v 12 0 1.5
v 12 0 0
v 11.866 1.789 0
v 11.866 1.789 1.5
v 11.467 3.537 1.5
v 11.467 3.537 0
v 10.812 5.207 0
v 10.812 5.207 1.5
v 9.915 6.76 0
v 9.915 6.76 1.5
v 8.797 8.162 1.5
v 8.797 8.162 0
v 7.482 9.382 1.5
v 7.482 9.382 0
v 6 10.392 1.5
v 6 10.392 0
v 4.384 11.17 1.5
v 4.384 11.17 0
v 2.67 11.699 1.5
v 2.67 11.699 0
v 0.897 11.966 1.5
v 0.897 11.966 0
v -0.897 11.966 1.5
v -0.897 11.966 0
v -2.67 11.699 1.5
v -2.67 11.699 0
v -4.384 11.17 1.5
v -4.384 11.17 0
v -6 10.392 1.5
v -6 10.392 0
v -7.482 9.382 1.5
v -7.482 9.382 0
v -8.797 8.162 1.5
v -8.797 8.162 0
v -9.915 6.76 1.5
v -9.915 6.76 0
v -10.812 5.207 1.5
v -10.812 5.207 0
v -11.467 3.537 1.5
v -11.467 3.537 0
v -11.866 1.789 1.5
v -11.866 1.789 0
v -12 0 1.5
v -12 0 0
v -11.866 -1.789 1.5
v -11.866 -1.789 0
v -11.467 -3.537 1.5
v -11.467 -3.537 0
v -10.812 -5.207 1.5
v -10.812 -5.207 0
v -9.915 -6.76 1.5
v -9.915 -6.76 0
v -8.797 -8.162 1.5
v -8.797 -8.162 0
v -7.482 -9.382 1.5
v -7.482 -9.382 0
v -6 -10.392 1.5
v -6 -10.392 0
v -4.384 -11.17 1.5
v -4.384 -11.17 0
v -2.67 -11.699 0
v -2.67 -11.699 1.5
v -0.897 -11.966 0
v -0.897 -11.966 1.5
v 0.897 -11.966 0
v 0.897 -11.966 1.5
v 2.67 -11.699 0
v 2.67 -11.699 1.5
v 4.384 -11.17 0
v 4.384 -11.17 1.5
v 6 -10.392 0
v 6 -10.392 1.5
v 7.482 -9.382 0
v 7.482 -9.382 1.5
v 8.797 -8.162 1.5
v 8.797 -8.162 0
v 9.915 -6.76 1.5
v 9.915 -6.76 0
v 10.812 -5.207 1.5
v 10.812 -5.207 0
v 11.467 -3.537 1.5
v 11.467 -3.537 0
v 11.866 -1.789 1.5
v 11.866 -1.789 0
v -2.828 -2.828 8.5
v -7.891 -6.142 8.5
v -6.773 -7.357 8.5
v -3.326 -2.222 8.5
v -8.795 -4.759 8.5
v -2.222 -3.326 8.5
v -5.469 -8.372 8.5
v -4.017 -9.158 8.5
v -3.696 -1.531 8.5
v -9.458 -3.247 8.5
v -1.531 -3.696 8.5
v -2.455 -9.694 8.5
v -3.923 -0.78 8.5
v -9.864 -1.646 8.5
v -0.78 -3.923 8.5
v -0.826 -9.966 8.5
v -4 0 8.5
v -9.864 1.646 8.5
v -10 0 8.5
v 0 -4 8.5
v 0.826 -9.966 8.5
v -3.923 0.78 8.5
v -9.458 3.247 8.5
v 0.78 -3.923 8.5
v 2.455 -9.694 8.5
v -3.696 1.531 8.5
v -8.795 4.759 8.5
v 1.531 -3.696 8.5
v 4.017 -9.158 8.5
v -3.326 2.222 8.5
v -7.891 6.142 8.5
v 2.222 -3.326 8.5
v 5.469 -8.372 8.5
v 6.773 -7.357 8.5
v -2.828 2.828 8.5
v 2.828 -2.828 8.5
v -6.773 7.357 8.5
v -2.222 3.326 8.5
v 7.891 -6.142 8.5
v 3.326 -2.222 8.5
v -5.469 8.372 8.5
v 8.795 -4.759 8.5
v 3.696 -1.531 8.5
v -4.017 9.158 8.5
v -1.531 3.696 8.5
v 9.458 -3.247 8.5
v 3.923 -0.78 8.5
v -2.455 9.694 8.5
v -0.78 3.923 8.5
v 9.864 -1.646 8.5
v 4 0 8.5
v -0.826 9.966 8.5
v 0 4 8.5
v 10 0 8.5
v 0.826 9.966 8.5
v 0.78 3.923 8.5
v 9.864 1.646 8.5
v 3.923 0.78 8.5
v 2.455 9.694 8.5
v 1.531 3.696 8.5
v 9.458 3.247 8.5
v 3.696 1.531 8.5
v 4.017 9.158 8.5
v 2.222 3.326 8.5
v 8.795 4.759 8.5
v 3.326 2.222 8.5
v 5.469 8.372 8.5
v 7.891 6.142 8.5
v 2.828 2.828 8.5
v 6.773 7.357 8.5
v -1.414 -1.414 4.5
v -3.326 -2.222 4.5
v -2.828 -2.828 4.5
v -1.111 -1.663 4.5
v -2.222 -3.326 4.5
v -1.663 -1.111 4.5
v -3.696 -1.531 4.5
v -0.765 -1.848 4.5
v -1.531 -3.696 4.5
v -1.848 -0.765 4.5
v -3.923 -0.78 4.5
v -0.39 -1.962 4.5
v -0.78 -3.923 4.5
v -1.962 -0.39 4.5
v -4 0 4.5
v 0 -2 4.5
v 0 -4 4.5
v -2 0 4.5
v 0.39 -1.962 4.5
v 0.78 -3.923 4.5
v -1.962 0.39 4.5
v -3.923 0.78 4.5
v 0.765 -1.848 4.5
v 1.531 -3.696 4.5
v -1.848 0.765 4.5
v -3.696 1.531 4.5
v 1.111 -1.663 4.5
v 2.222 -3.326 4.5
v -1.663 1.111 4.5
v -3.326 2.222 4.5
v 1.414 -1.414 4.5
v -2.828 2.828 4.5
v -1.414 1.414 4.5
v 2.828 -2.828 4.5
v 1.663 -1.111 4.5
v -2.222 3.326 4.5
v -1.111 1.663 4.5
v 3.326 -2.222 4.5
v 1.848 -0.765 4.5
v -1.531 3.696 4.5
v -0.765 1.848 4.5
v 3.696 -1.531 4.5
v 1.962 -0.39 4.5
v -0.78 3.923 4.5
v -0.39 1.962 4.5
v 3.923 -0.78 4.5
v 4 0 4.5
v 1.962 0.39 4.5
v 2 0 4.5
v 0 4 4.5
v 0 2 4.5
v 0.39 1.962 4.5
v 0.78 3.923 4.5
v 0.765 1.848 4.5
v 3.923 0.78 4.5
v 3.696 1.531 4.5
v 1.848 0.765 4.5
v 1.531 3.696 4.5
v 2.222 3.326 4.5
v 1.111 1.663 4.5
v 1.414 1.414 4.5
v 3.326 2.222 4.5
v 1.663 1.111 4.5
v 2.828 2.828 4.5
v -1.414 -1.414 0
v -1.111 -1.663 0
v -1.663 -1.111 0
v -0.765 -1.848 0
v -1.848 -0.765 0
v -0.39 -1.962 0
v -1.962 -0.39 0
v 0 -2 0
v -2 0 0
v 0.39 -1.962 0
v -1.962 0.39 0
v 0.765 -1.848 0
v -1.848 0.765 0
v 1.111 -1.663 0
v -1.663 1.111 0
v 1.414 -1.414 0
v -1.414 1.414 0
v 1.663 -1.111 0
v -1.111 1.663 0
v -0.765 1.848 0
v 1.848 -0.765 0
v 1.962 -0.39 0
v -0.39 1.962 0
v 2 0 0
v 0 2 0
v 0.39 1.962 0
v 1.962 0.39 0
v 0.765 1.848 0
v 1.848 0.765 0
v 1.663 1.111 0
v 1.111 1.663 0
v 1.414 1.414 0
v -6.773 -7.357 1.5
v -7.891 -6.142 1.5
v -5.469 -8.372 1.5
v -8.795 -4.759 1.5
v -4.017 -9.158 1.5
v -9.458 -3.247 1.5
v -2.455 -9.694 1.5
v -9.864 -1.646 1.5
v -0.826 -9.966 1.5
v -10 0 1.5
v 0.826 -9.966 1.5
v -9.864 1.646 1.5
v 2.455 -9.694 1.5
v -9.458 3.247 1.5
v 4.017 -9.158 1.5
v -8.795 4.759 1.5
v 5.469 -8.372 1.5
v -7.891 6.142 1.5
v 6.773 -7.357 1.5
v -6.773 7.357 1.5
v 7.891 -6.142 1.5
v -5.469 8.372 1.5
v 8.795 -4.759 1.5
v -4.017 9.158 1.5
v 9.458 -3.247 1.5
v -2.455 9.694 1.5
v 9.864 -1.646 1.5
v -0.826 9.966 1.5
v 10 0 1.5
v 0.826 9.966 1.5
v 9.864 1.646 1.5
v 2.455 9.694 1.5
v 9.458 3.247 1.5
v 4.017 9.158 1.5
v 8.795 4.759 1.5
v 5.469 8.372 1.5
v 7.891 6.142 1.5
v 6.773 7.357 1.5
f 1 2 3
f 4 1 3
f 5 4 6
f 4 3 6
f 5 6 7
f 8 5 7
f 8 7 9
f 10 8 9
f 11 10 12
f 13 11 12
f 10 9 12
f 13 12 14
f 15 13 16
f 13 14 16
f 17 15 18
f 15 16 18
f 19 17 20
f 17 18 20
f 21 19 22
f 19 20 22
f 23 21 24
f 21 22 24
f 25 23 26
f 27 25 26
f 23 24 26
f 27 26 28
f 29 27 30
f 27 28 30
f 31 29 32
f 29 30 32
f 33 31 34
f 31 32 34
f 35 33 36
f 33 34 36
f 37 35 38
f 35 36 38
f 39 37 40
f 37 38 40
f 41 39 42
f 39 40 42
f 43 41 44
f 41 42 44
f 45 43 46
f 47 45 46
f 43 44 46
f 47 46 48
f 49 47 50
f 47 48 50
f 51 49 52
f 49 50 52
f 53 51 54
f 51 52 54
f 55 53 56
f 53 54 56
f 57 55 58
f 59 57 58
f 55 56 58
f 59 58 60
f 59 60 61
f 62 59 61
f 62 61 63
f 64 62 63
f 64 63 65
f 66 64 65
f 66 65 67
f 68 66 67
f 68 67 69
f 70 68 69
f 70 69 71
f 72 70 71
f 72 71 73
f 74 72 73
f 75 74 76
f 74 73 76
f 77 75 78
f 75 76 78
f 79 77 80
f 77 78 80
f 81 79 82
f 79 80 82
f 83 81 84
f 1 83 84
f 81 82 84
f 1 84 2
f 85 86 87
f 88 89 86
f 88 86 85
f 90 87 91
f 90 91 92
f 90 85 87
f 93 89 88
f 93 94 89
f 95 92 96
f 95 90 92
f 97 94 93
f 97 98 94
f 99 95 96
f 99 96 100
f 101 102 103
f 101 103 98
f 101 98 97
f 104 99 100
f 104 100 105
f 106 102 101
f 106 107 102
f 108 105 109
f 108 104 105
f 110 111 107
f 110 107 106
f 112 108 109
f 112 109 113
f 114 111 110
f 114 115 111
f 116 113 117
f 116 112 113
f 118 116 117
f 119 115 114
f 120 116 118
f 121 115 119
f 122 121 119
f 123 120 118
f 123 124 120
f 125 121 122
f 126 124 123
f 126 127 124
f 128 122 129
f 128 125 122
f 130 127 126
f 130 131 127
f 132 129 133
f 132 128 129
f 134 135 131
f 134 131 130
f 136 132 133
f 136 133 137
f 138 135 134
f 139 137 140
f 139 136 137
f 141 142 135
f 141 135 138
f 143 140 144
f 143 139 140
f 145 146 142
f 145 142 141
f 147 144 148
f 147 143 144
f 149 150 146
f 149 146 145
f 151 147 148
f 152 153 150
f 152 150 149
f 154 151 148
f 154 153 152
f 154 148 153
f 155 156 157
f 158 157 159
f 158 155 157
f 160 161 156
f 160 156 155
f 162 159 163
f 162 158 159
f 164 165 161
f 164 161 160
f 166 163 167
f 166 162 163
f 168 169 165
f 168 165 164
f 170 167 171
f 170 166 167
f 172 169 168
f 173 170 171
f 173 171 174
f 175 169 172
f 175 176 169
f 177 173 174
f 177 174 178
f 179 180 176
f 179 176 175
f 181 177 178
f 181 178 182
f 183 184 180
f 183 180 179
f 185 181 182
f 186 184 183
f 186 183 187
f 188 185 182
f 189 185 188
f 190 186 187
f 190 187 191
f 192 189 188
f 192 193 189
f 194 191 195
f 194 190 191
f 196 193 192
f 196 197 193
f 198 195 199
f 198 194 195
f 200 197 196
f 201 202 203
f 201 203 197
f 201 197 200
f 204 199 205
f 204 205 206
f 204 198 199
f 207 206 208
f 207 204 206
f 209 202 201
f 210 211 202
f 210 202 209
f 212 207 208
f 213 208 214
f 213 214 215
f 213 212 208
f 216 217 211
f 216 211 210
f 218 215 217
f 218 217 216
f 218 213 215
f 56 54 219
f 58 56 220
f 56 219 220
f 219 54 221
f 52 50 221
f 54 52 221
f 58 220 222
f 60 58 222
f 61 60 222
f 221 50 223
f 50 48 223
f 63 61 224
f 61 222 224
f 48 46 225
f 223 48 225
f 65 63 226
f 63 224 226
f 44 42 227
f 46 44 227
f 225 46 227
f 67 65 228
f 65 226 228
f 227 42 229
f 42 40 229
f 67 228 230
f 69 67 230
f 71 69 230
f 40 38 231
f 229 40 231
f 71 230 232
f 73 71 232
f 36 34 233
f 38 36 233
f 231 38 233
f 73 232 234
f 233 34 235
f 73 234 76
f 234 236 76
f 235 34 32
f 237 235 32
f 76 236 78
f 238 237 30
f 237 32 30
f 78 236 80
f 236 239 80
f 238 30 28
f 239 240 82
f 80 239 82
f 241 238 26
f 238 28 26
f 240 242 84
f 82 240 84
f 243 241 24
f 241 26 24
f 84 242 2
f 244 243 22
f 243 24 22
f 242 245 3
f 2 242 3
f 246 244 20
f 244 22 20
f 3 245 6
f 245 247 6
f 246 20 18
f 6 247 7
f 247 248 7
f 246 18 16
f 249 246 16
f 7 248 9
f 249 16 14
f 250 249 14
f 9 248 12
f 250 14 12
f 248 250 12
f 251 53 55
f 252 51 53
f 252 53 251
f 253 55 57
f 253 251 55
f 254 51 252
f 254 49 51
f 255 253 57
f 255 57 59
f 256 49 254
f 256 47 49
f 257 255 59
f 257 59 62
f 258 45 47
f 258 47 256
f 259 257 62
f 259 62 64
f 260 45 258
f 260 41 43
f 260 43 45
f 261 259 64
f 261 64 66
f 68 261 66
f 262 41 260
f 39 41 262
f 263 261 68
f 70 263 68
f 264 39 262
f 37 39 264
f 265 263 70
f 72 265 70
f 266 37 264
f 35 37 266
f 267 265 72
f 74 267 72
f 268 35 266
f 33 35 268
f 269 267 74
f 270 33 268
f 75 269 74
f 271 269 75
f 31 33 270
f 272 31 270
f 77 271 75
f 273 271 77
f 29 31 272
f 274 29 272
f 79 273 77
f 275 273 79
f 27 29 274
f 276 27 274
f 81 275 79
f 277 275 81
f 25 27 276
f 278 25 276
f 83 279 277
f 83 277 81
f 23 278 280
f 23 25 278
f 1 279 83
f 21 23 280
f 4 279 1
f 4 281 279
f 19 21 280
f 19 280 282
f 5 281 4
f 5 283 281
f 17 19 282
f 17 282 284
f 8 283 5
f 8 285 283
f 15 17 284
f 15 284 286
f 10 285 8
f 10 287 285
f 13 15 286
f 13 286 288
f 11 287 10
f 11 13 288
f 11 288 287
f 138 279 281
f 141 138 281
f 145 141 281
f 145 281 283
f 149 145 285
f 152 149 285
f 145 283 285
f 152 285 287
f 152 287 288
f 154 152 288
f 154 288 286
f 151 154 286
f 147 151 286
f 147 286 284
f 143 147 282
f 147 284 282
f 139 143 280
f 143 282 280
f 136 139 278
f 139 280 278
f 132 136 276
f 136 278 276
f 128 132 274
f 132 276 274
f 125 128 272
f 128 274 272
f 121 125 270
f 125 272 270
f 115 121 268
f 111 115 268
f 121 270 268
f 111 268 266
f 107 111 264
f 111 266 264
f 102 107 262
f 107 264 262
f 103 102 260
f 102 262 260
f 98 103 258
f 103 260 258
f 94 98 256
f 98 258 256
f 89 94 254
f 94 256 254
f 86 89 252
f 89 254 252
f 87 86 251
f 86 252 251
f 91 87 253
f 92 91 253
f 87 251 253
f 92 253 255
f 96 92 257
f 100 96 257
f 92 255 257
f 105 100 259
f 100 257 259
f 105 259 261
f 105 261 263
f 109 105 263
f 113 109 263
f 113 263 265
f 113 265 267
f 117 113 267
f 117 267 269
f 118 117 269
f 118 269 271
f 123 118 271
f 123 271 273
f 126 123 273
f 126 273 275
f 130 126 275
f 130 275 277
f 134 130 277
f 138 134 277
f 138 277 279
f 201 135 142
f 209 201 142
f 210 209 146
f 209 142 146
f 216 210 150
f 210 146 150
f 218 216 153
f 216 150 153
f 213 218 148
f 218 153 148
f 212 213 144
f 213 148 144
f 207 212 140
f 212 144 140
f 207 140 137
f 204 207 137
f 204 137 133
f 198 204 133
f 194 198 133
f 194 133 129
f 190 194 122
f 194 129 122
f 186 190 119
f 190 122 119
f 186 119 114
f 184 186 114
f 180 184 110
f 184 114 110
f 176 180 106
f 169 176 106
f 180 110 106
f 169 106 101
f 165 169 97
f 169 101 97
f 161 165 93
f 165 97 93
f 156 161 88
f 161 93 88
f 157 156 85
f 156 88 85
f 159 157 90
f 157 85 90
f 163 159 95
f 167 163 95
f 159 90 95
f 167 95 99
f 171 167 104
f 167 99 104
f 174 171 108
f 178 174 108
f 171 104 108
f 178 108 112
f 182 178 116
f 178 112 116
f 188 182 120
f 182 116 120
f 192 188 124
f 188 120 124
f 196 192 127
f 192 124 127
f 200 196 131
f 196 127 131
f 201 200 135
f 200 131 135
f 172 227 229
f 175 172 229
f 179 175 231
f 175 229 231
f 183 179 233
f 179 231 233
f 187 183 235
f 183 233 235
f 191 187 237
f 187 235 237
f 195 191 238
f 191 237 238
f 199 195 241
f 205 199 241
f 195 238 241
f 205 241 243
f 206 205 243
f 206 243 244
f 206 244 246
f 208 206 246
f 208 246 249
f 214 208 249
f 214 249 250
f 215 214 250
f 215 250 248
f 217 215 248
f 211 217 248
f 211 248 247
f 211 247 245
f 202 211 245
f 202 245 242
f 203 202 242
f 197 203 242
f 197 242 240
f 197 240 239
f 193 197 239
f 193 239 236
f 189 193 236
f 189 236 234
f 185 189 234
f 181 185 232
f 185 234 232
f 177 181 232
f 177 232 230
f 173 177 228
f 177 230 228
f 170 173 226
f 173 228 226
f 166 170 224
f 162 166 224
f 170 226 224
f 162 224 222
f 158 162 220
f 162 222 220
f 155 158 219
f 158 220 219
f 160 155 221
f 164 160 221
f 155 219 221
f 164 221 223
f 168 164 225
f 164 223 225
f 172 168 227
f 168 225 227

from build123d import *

# Parameters (mm, degrees)
SKETCH_1_R          = 12
EXTRUDE_1_DEPTH     = 1.5
SKETCH_2_R          = 10
EXTRUDE_2_DEPTH     = 7
SKETCH_3_R          = 2
CUT_EXTRUDE_1_DEPTH = 27
SKETCH_4_R          = 4
CUT_EXTRUDE_2_DEPTH = 4


with BuildPart() as part:
    # 草图1 → 凸台-拉伸1 (new body)
    with BuildSketch(Plane.XY):
        Circle(SKETCH_1_R)
    extrude(amount=EXTRUDE_1_DEPTH)

    # 草图2 → 凸台-拉伸2 (add)
    with BuildSketch(Plane.XY.offset(1.5)):
        Circle(SKETCH_2_R)
    extrude(amount=EXTRUDE_2_DEPTH)

    # 草图3 → 切除-拉伸1 (cut)
    with BuildSketch(Plane(origin=(0, 0, 0), x_dir=(-1, 0, 0), z_dir=(0, 0, -1))):
        Circle(SKETCH_3_R)
    extrude(amount=-CUT_EXTRUDE_1_DEPTH, mode=Mode.SUBTRACT)

    # 草图4 → 切除-拉伸2 (cut)
    with BuildSketch(Plane.XY.offset(8.5)):
        Circle(SKETCH_4_R)
    extrude(amount=-CUT_EXTRUDE_2_DEPTH, mode=Mode.SUBTRACT)


solid = part.part
